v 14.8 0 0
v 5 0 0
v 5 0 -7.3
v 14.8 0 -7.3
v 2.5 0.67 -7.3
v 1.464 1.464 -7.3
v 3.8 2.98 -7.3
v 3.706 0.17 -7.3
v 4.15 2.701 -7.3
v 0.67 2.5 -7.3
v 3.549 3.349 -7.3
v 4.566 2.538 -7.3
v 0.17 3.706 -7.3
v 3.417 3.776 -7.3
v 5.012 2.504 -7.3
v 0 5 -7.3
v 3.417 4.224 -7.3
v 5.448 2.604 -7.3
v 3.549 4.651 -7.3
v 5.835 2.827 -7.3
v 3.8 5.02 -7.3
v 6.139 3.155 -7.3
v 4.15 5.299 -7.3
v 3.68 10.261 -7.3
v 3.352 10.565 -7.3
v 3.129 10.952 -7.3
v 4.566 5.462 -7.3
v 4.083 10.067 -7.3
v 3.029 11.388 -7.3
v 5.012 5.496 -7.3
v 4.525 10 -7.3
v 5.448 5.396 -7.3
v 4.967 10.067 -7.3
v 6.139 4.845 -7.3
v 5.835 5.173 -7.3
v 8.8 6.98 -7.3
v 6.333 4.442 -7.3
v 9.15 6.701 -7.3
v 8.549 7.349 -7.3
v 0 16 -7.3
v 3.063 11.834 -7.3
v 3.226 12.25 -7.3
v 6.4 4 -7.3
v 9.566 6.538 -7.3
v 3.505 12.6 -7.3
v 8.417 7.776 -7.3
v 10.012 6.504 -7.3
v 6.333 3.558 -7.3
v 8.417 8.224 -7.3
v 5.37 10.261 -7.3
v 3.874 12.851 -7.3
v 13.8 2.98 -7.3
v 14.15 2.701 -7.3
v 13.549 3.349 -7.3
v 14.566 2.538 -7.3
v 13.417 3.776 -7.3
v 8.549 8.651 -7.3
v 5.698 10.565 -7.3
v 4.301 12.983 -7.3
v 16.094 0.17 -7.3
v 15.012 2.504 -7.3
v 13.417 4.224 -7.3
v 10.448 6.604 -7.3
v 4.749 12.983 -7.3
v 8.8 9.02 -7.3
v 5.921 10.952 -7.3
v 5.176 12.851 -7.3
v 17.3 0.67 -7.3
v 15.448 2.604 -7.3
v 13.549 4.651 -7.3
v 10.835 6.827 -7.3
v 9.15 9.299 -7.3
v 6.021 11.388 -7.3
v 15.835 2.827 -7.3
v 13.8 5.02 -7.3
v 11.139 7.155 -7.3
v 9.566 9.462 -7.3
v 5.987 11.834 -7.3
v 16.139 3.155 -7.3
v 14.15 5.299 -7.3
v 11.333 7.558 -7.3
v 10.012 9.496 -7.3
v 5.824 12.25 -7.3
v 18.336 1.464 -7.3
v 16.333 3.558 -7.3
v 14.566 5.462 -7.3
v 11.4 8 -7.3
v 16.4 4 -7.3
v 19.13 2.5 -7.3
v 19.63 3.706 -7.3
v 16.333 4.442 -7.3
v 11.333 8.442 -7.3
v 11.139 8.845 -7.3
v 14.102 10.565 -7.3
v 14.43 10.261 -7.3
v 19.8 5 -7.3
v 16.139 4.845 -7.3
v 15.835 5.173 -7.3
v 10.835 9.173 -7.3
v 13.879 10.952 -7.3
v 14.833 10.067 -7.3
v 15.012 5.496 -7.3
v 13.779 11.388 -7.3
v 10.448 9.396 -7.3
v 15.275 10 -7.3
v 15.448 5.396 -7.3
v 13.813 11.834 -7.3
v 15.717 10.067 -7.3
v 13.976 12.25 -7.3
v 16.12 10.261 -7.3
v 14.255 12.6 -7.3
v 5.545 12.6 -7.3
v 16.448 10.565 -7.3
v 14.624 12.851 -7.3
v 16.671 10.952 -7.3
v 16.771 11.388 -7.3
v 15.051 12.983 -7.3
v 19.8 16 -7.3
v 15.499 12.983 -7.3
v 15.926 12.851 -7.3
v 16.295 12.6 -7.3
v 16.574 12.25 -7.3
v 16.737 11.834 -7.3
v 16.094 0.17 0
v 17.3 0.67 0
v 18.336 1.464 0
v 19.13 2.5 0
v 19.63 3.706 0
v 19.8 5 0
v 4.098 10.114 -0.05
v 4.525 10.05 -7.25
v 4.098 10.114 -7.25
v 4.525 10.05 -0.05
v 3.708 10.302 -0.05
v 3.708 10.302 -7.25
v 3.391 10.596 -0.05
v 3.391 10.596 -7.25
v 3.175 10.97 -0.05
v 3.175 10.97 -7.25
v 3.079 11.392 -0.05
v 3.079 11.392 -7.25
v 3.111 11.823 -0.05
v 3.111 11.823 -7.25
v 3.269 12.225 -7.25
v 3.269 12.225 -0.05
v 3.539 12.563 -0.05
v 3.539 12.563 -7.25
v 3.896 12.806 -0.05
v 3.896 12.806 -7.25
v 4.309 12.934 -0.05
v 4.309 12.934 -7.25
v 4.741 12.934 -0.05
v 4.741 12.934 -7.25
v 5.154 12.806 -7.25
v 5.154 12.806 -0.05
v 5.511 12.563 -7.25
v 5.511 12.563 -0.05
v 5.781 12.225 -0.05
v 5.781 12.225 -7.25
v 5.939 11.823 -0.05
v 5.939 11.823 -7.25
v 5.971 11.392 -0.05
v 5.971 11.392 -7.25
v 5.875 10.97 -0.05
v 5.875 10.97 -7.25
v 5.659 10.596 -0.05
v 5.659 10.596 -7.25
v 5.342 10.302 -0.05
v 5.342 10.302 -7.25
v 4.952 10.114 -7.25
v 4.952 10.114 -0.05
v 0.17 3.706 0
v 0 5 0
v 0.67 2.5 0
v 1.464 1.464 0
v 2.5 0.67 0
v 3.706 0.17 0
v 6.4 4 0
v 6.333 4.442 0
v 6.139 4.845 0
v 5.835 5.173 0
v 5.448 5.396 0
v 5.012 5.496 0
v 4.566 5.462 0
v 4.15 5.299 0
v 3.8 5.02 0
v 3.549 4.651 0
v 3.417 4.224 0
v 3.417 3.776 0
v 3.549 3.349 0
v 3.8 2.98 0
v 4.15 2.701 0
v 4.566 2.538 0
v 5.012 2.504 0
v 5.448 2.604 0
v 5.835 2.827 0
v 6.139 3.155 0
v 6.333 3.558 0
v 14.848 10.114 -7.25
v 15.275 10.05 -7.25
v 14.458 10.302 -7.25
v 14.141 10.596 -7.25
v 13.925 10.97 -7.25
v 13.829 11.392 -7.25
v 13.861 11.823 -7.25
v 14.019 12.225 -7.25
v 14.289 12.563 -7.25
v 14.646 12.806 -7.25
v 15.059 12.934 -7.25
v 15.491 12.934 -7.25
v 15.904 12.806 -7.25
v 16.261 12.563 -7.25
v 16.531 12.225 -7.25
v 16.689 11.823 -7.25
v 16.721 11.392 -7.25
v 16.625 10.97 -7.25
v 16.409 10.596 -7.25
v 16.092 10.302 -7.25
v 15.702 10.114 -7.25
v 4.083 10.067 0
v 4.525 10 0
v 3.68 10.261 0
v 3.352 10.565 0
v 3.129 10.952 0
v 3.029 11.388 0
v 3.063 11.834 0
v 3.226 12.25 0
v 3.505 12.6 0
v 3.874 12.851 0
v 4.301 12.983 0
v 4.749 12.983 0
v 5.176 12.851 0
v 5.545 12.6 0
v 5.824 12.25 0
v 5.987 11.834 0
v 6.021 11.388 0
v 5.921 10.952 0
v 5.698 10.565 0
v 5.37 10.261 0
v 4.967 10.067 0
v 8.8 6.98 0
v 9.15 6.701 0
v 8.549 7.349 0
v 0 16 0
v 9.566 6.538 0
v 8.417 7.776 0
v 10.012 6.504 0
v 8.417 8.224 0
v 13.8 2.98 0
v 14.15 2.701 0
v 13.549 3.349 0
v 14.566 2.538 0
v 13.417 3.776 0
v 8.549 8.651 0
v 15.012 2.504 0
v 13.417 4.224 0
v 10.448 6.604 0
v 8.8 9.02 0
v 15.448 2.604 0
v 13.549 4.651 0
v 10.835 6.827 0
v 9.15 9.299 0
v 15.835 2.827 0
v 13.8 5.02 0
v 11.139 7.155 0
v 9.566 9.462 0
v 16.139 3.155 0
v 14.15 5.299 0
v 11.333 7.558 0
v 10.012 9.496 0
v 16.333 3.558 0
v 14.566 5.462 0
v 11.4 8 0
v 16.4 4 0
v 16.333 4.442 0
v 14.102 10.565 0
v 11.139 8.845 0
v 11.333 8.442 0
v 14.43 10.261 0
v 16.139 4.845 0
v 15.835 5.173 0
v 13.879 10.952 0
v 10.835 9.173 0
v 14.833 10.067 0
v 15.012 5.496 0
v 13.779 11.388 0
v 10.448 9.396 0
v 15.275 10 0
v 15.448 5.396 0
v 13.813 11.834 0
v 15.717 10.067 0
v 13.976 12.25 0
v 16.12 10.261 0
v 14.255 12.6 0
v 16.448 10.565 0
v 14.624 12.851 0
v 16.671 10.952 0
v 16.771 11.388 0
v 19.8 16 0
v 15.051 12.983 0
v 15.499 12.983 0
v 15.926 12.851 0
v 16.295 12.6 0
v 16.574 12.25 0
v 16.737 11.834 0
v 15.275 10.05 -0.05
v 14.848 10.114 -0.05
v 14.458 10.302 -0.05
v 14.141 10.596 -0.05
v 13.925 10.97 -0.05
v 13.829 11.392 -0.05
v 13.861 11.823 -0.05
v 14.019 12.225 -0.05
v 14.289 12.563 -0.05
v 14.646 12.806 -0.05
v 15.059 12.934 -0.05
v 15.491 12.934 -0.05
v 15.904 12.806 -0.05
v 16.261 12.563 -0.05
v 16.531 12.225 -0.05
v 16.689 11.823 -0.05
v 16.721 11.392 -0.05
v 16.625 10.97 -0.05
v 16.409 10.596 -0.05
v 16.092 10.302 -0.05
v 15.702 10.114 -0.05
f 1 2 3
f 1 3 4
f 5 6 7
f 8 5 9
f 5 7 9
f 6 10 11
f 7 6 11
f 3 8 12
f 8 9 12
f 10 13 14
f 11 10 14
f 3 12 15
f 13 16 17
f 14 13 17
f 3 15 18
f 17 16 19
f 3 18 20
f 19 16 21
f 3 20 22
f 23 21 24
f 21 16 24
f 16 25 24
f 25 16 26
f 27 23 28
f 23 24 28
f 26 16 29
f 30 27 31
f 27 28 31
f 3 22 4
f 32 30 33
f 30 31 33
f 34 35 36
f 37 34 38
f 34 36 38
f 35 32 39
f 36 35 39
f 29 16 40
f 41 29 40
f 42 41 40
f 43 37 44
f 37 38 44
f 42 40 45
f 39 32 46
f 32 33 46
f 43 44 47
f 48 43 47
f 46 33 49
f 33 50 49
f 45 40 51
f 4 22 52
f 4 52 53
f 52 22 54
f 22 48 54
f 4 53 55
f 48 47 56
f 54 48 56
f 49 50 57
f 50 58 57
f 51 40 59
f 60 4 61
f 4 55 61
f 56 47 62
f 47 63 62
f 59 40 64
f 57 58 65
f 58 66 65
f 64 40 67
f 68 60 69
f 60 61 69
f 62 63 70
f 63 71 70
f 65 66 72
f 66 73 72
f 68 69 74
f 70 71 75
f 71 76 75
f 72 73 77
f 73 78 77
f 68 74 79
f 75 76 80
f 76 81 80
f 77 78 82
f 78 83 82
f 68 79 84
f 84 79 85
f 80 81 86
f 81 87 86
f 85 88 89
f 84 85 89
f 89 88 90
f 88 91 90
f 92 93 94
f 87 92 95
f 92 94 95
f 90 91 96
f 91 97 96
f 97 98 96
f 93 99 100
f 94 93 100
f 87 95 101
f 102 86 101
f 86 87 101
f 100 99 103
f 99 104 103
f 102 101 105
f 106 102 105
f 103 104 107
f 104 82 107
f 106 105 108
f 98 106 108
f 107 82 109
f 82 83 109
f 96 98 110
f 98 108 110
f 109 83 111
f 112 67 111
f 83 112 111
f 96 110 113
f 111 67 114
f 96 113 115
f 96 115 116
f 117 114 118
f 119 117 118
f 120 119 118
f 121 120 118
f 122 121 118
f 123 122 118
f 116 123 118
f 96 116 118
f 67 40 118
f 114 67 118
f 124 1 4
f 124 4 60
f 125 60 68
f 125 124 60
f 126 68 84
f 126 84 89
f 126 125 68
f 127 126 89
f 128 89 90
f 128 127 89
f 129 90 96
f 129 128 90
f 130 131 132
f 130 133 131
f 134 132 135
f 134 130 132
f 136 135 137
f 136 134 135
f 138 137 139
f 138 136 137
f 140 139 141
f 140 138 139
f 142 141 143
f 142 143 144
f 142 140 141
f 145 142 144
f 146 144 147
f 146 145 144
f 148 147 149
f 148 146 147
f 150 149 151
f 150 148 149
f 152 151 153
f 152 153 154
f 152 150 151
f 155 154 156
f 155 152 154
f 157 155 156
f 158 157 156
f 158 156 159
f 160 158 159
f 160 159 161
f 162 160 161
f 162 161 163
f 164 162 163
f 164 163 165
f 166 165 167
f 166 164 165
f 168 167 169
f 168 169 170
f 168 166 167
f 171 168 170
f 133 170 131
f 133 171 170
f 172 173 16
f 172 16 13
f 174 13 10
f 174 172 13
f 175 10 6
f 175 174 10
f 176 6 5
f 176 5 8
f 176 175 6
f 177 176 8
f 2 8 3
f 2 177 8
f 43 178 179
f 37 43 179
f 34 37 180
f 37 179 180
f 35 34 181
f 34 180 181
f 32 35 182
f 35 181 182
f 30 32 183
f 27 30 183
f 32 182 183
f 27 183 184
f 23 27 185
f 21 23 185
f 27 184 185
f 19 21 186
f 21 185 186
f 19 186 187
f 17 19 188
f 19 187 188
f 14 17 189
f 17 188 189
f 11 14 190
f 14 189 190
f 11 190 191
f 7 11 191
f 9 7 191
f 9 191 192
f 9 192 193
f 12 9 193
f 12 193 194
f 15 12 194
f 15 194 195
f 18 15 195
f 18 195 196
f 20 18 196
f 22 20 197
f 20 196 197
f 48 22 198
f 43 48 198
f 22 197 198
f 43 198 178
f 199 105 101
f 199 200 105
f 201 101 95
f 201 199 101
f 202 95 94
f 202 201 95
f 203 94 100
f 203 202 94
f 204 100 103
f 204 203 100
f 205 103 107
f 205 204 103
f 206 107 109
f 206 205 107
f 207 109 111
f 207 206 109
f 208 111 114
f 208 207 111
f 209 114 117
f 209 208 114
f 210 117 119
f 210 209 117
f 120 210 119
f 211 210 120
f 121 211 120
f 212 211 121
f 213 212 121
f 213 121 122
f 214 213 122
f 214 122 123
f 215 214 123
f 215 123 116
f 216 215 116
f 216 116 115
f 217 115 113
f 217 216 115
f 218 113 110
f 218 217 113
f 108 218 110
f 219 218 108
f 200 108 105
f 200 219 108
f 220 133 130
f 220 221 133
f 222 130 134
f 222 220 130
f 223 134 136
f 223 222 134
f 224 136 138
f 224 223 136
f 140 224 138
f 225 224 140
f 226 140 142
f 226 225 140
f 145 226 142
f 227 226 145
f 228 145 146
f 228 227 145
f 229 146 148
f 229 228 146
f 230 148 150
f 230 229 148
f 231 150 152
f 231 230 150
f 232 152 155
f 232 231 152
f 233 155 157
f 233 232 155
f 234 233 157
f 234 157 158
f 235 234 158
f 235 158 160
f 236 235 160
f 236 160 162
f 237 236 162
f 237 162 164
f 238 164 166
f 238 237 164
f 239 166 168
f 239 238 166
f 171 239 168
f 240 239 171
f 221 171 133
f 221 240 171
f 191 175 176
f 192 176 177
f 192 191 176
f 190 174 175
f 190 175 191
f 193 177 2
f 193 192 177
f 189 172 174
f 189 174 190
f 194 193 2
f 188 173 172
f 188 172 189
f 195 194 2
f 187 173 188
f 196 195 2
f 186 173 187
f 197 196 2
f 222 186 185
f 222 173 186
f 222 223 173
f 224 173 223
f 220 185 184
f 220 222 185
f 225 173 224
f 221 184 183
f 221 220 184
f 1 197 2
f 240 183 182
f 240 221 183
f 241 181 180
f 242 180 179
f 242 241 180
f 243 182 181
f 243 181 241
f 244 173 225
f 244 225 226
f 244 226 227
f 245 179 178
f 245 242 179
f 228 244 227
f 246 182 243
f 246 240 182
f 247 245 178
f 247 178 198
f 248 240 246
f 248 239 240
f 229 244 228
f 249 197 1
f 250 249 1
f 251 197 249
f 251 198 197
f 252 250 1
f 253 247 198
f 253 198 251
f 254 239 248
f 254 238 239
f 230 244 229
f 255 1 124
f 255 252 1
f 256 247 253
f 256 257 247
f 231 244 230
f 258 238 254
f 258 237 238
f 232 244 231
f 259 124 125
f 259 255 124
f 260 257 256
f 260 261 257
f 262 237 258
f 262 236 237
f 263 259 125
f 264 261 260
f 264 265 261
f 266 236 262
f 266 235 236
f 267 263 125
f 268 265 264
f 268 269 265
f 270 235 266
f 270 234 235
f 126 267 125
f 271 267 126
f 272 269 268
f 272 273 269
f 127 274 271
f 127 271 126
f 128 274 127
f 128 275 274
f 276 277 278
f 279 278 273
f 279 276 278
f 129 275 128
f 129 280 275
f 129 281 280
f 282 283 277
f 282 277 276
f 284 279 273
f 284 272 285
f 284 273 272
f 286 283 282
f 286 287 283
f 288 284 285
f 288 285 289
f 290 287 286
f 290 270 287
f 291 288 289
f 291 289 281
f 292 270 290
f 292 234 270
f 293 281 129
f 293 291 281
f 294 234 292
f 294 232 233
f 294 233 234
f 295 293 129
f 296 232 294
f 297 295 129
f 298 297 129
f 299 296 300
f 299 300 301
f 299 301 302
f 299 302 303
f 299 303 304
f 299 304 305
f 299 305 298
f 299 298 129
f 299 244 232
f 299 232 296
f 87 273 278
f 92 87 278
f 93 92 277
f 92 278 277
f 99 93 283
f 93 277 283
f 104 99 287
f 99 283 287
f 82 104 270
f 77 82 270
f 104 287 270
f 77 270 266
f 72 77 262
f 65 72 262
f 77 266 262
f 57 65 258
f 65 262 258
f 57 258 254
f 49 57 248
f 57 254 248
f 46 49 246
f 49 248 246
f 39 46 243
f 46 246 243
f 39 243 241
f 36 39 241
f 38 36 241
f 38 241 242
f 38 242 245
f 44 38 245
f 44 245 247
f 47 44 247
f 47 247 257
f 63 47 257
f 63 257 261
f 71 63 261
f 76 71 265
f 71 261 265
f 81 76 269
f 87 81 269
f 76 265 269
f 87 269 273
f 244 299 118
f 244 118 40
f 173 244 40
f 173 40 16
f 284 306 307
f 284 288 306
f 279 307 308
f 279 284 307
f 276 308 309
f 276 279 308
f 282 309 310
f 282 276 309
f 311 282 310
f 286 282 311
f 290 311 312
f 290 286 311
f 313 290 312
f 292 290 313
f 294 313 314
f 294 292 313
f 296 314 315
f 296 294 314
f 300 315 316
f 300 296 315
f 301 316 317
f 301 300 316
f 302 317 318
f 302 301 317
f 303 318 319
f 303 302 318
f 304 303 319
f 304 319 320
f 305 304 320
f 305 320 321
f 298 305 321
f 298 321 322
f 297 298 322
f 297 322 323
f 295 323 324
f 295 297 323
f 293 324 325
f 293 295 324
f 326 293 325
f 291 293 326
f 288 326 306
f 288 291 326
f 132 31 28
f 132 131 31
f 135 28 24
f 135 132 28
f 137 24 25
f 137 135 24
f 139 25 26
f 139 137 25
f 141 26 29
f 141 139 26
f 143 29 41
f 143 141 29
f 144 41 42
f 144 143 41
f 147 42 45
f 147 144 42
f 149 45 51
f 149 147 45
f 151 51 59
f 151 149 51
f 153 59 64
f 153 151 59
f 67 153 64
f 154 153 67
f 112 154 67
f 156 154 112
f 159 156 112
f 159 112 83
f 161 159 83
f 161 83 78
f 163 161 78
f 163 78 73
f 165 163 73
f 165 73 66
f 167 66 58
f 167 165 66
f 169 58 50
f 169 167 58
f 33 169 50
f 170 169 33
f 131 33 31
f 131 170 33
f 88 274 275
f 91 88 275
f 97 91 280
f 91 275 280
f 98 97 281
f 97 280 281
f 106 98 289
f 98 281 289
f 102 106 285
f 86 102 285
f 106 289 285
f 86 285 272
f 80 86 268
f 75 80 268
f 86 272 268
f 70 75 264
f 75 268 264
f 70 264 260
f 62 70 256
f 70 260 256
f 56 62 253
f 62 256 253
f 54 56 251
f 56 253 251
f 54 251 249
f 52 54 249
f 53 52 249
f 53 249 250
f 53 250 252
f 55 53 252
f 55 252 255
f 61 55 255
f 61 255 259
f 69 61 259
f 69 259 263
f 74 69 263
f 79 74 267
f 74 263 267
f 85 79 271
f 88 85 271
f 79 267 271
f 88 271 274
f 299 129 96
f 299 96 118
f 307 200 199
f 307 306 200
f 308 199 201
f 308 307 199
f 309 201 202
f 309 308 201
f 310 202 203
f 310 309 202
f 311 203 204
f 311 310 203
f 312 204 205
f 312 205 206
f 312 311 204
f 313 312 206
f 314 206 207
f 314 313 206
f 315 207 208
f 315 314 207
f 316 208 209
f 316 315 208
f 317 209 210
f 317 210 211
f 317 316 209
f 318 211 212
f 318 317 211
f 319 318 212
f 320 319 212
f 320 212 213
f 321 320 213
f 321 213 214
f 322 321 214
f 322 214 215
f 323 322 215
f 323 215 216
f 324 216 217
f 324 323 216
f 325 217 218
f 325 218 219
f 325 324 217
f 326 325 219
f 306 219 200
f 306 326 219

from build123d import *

# Parameters (mm, degrees)
SKETCH_1_R                   = 1.5
SKETCH_1_R_2                 = 1.25
EXTRUDE_1_DEPTH              = 7.3
HOLE_WIZARD_M2_51_AT_2_COUNT = 2
HOLE_WIZARD_M2_51_AT_2_PITCH = 10.75


with BuildPart() as part:
    # Эскиз1 → Бобышка-Вытянуть1 (new body)
    with BuildSketch(Plane.XY):
        with BuildLine():
            Line((5, 0), (14.8, 0))
            ThreePointArc((14.8, 0), (18.335533906, 1.464466094), (19.8, 5))
            Line((19.8, 5), (19.8, 16))
            Line((19.8, 16), (0, 16))
            Line((0, 16), (0, 5))
            ThreePointArc((0, 5), (1.464466094, 1.464466094), (5, 0))
        make_face()
        with Locations((9.9, 8)):
            Circle(SKETCH_1_R, mode=Mode.SUBTRACT)
        with Locations((4.525, 11.5)):
            Circle(SKETCH_1_R_2, mode=Mode.SUBTRACT)
        with Locations((4.9, 4)):
            Circle(SKETCH_1_R, mode=Mode.SUBTRACT)
        with Locations((14.9, 4)):
            Circle(SKETCH_1_R, mode=Mode.SUBTRACT)
        with Locations((15.275, 11.5)):
            Circle(SKETCH_1_R_2, mode=Mode.SUBTRACT)
    extrude(amount=-EXTRUDE_1_DEPTH)

    # Эскиз2 → Зенковка для  винта с плоской головкой M2.51 (revolve, cut)
    with BuildSketch(Plane(origin=(4.525, 11.5, 0), x_dir=(0, -1, 0), z_dir=(1, 0, 0))):
        Polygon((0, 0), (0, 7.3), (1.5, 7.3), (1.45, 7.25), (1.45, 0.05), (1.5, 0), align=None)
    hole_wizard_m2_51 = revolve(axis=Axis((4.525, 11.5, 6.35), (0, 0, -1)), mode=Mode.SUBTRACT)

    # Зенковка для  винта с плоской головкой M2.51 at 2: Зенковка для  винта с плоской головкой M2.51 ×2
    with Locations(*[(i * HOLE_WIZARD_M2_51_AT_2_PITCH, 0, 0) for i in range(1, HOLE_WIZARD_M2_51_AT_2_COUNT)]):
        add(hole_wizard_m2_51, mode=Mode.SUBTRACT)


solid = part.part
